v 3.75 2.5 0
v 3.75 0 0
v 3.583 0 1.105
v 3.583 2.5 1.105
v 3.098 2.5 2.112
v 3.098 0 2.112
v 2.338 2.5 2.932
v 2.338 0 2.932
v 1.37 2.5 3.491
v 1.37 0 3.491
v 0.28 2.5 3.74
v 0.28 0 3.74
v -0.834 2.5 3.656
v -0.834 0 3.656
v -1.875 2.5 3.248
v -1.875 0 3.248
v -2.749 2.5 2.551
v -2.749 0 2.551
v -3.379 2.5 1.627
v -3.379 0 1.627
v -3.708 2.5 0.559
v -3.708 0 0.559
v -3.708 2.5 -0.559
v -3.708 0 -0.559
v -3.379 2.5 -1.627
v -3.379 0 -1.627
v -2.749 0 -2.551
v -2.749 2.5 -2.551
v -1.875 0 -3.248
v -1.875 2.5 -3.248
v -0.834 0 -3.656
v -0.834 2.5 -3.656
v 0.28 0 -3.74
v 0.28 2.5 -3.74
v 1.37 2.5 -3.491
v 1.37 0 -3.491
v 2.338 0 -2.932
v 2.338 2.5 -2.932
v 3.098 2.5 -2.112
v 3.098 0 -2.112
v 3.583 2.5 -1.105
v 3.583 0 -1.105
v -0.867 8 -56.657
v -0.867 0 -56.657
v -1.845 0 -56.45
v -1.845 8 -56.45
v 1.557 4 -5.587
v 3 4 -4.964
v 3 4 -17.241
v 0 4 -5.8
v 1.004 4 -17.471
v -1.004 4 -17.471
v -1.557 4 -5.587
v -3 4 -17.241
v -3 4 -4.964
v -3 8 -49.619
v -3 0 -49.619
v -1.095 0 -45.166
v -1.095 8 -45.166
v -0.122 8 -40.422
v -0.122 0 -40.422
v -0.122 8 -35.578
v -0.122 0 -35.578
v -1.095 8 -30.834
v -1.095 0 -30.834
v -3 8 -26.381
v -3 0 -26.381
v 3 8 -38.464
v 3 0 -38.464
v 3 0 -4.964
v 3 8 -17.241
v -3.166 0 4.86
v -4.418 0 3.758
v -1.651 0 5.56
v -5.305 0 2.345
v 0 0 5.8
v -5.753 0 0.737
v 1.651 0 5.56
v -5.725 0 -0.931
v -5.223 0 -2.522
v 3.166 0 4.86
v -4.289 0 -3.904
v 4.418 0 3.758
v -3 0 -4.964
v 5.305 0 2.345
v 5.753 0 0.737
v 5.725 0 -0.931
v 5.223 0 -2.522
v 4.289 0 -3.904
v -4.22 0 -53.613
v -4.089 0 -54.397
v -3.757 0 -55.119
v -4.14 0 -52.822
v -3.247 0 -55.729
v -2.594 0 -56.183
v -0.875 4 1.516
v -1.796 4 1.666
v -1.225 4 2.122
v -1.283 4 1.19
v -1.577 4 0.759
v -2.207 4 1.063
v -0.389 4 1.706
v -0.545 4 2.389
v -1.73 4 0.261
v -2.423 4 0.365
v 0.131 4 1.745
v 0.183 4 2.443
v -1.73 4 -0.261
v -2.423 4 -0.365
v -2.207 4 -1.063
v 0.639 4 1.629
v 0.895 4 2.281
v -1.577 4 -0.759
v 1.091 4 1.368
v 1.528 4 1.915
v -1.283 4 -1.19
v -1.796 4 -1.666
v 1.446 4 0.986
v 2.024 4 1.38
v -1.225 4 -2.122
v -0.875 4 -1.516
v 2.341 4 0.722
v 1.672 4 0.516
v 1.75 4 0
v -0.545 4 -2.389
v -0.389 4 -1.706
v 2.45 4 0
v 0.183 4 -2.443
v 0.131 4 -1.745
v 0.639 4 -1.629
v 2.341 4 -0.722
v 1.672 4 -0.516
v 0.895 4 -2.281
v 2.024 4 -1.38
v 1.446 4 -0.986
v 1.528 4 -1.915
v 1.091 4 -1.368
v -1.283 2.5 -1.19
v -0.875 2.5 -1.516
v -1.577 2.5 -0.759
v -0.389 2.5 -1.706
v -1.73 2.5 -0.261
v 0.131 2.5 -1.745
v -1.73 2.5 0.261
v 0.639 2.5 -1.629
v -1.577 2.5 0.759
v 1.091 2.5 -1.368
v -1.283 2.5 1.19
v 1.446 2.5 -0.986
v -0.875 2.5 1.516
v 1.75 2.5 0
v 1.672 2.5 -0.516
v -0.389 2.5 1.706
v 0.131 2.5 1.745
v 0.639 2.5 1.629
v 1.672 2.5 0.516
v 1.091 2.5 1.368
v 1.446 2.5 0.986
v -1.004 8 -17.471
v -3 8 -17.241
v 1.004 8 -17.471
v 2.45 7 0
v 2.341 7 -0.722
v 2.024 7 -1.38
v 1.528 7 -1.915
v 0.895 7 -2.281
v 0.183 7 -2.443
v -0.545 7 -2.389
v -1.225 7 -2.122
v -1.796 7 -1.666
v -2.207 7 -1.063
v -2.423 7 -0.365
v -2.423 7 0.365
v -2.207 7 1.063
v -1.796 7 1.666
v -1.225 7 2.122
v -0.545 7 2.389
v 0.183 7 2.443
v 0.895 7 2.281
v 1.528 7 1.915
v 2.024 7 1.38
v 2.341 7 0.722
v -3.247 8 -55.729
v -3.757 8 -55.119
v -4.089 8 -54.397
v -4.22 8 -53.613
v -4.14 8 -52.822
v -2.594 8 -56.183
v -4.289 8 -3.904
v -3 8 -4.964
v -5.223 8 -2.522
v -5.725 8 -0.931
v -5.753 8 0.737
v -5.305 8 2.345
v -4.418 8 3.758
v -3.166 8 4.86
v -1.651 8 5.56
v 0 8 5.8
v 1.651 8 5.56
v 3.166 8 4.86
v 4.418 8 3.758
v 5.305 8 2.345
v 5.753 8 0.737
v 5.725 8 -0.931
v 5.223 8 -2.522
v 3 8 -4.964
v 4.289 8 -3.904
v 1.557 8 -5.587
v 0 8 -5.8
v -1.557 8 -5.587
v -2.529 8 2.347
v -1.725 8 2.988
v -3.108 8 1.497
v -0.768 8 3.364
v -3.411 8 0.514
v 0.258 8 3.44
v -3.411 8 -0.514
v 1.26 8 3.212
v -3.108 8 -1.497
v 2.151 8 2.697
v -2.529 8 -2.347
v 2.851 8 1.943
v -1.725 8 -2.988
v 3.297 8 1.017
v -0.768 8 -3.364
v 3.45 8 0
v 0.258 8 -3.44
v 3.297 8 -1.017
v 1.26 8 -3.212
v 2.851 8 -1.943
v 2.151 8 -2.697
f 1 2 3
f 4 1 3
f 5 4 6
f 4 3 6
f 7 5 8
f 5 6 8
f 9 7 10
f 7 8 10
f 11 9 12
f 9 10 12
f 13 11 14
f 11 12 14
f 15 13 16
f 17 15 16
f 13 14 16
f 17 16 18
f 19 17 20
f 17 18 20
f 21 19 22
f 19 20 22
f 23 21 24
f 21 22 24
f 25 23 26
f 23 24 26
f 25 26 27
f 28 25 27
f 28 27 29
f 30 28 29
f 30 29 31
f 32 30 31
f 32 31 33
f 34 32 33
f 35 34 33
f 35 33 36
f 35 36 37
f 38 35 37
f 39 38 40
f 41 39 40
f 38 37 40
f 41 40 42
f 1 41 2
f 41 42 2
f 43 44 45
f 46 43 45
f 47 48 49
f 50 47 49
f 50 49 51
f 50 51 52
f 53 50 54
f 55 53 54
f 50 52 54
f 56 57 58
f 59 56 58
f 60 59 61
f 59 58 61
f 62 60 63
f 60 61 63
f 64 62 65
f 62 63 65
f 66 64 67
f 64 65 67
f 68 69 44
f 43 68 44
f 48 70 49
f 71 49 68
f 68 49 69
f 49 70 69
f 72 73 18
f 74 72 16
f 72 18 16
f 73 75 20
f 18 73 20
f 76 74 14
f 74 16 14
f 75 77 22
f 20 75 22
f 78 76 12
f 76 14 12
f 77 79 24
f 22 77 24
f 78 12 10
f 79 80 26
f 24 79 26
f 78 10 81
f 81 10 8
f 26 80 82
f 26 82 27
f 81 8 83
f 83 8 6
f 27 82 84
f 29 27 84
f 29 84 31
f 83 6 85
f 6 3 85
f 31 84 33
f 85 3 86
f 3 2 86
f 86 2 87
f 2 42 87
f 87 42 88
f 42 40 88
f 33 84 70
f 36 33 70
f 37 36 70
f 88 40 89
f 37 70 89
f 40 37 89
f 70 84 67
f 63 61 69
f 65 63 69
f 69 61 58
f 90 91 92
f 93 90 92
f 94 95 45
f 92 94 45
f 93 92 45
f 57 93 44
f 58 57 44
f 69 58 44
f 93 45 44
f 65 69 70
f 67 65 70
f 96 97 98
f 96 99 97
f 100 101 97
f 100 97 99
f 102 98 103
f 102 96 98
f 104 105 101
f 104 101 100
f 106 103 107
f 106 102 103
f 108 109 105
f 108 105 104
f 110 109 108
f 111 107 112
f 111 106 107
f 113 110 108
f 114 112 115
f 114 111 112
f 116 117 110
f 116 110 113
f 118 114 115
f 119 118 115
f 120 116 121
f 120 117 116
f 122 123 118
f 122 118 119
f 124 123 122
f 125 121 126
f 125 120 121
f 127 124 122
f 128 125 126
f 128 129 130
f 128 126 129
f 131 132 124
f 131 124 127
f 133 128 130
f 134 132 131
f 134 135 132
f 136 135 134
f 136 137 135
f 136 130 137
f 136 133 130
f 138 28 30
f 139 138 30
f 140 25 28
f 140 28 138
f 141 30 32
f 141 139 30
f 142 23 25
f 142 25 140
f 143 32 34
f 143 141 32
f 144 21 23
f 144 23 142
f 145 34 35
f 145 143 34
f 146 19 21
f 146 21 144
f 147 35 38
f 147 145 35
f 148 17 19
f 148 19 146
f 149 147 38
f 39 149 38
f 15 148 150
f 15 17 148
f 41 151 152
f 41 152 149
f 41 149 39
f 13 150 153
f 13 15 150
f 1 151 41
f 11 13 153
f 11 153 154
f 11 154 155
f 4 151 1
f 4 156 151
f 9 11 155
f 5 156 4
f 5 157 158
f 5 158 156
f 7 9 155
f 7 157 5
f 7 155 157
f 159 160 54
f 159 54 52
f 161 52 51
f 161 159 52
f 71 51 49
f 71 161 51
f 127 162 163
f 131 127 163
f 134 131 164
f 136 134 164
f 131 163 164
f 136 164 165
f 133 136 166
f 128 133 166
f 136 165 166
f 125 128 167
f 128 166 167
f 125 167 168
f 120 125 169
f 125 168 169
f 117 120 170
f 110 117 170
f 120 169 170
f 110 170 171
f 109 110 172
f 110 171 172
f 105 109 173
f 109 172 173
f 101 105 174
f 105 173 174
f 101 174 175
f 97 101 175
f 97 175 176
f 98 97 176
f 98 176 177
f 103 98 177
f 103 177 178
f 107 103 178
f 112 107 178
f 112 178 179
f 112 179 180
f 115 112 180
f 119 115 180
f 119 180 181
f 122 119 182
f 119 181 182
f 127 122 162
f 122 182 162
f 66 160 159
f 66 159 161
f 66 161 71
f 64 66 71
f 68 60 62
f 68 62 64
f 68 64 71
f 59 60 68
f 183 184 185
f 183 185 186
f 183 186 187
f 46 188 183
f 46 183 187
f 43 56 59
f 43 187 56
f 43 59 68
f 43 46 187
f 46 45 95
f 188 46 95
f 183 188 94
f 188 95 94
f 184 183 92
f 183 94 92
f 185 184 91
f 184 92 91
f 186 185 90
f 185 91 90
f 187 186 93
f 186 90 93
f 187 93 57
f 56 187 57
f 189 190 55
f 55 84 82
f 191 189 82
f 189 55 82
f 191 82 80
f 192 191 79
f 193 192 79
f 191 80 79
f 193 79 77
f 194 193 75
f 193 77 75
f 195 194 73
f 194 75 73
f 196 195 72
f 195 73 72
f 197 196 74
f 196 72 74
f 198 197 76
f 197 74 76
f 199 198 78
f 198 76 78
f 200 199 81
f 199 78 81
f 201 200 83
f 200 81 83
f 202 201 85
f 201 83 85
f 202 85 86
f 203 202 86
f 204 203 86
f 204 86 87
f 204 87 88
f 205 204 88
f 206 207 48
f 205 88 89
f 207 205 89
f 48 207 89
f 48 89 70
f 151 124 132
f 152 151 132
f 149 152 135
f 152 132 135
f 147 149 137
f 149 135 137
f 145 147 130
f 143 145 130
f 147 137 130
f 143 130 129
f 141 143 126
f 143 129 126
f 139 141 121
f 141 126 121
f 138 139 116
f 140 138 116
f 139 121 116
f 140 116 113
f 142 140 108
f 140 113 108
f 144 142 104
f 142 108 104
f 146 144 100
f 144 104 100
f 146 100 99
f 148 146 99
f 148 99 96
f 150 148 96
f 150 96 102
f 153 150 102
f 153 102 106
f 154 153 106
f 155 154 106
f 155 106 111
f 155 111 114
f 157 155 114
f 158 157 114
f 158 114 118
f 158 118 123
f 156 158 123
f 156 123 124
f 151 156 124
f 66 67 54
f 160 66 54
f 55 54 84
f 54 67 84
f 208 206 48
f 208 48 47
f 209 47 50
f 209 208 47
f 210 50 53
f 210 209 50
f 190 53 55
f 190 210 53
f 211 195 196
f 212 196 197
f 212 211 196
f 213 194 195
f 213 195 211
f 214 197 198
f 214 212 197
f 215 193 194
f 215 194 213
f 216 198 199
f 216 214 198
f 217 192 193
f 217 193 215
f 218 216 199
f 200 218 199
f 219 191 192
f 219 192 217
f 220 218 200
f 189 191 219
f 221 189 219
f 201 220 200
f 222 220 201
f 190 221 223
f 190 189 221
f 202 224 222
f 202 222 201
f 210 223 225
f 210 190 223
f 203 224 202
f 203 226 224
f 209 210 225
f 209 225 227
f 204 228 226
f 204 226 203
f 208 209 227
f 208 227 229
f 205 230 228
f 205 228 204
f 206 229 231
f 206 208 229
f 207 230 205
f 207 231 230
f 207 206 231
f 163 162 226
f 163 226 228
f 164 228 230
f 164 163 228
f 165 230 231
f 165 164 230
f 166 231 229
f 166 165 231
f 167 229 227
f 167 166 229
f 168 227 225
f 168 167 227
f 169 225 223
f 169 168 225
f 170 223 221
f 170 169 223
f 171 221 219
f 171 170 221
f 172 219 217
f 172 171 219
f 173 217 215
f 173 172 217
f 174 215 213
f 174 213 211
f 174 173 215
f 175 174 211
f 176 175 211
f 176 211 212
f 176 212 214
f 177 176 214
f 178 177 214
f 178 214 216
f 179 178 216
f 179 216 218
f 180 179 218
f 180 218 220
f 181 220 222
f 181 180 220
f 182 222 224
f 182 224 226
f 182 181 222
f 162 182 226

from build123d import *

# Parameters (mm, degrees)
BOSS_EXTRU_1_DEPTH      = 8
ESQUISSE2_R             = 2.45
ENL_V_MAT_EXTRU_1_DEPTH = 4
ENL_V_MAT_EXTRU_2_REACH = 6
ESQUISSE3_R             = 1.75
ESQUISSE4_R             = 3.75
ENL_V_MAT_EXTRU_3_DEPTH = 2.5
ENL_V_MAT_EXTRU_4_DEPTH = 4
CHANFREIN1_SIZE         = 1


with BuildPart() as part:
    # Esquisse1 → Boss.-Extru.1 (new body)
    with BuildSketch(Plane(origin=(0, 0, 0), x_dir=(1, 0, 0), z_dir=(0, 1, 0))):
        with BuildLine():
            Line((-3, 26.381049961), (-3, 4.963869458))
            ThreePointArc((-3, 4.963869458), (0, -5.8), (3, 4.963869458))
            Line((3, 4.963869458), (3, 38.463869458))
            Line((3, 38.463869458), (-0.867157449, 56.657414832))
            Line((-0.867157449, 56.657414832), (-1.84530505, 56.449503141))
            ThreePointArc((-1.84530505, 56.449503141), (-3.756758837, 55.119060789), (-4.140414176, 52.821988519))
            Line((-4.140414176, 52.821988519), (-3, 49.618950039))
            ThreePointArc((-3, 49.618950039), (0, 38), (-3, 26.381049961))
        make_face()
    extrude(amount=BOSS_EXTRU_1_DEPTH)

    # Esquisse2 → Enlèv. mat.-Extru.1 (cut)
    with BuildSketch(Plane(origin=(0, 8, 0), x_dir=(1, 0, 0), z_dir=(0, 1, 0))):
        Circle(ESQUISSE2_R)
    extrude(amount=-ENL_V_MAT_EXTRU_1_DEPTH, mode=Mode.SUBTRACT)

    # Esquisse3 → Enlèv. mat.-Extru.2 (cut, up to next)
    with BuildSketch(Plane(origin=(0, 4, 0), x_dir=(1, 0, 0), z_dir=(0, 1, 0)), mode=Mode.PRIVATE) as enl_v_mat_extru_2_sk1:
        Circle(ESQUISSE3_R)
    enl_v_mat_extru_2_tool1 = extrude(enl_v_mat_extru_2_sk1.sketch, amount=-ENL_V_MAT_EXTRU_2_REACH, mode=Mode.PRIVATE) & part.part
    add(enl_v_mat_extru_2_tool1.solids().sort_by_distance((0, 4, 0))[0], mode=Mode.SUBTRACT)

    # Esquisse4 → Enlèv. mat.-Extru.3 (cut)
    with BuildSketch(Plane.XZ):
        Circle(ESQUISSE4_R)
    extrude(amount=-ENL_V_MAT_EXTRU_3_DEPTH, mode=Mode.SUBTRACT)

    # Esquisse5 → Enlèv. mat.-Extru.4 (cut)
    with BuildSketch(Plane(origin=(0, 8, 0), x_dir=(1, 0, 0), z_dir=(0, 1, 0))):
        with BuildLine():
            Line((-3, 4.963869458), (-3, 17.24093965))
            ThreePointArc((-3, 17.24093965), (0, 17.5), (3, 17.24093965))
            Line((3, 17.24093965), (3, 4.963869458))
            ThreePointArc((3, 4.963869458), (0, 5.8), (-3, 4.963869458))
        make_face()
    extrude(amount=-ENL_V_MAT_EXTRU_4_DEPTH, mode=Mode.SUBTRACT)

    # Chanfrein1
    chanfrein1_edges = [part.edges().sort_by_distance(p)[0] for p in [
        (-2.45, 8, 0),
    ]]
    chamfer(chanfrein1_edges, length=CHANFREIN1_SIZE)


solid = part.part
